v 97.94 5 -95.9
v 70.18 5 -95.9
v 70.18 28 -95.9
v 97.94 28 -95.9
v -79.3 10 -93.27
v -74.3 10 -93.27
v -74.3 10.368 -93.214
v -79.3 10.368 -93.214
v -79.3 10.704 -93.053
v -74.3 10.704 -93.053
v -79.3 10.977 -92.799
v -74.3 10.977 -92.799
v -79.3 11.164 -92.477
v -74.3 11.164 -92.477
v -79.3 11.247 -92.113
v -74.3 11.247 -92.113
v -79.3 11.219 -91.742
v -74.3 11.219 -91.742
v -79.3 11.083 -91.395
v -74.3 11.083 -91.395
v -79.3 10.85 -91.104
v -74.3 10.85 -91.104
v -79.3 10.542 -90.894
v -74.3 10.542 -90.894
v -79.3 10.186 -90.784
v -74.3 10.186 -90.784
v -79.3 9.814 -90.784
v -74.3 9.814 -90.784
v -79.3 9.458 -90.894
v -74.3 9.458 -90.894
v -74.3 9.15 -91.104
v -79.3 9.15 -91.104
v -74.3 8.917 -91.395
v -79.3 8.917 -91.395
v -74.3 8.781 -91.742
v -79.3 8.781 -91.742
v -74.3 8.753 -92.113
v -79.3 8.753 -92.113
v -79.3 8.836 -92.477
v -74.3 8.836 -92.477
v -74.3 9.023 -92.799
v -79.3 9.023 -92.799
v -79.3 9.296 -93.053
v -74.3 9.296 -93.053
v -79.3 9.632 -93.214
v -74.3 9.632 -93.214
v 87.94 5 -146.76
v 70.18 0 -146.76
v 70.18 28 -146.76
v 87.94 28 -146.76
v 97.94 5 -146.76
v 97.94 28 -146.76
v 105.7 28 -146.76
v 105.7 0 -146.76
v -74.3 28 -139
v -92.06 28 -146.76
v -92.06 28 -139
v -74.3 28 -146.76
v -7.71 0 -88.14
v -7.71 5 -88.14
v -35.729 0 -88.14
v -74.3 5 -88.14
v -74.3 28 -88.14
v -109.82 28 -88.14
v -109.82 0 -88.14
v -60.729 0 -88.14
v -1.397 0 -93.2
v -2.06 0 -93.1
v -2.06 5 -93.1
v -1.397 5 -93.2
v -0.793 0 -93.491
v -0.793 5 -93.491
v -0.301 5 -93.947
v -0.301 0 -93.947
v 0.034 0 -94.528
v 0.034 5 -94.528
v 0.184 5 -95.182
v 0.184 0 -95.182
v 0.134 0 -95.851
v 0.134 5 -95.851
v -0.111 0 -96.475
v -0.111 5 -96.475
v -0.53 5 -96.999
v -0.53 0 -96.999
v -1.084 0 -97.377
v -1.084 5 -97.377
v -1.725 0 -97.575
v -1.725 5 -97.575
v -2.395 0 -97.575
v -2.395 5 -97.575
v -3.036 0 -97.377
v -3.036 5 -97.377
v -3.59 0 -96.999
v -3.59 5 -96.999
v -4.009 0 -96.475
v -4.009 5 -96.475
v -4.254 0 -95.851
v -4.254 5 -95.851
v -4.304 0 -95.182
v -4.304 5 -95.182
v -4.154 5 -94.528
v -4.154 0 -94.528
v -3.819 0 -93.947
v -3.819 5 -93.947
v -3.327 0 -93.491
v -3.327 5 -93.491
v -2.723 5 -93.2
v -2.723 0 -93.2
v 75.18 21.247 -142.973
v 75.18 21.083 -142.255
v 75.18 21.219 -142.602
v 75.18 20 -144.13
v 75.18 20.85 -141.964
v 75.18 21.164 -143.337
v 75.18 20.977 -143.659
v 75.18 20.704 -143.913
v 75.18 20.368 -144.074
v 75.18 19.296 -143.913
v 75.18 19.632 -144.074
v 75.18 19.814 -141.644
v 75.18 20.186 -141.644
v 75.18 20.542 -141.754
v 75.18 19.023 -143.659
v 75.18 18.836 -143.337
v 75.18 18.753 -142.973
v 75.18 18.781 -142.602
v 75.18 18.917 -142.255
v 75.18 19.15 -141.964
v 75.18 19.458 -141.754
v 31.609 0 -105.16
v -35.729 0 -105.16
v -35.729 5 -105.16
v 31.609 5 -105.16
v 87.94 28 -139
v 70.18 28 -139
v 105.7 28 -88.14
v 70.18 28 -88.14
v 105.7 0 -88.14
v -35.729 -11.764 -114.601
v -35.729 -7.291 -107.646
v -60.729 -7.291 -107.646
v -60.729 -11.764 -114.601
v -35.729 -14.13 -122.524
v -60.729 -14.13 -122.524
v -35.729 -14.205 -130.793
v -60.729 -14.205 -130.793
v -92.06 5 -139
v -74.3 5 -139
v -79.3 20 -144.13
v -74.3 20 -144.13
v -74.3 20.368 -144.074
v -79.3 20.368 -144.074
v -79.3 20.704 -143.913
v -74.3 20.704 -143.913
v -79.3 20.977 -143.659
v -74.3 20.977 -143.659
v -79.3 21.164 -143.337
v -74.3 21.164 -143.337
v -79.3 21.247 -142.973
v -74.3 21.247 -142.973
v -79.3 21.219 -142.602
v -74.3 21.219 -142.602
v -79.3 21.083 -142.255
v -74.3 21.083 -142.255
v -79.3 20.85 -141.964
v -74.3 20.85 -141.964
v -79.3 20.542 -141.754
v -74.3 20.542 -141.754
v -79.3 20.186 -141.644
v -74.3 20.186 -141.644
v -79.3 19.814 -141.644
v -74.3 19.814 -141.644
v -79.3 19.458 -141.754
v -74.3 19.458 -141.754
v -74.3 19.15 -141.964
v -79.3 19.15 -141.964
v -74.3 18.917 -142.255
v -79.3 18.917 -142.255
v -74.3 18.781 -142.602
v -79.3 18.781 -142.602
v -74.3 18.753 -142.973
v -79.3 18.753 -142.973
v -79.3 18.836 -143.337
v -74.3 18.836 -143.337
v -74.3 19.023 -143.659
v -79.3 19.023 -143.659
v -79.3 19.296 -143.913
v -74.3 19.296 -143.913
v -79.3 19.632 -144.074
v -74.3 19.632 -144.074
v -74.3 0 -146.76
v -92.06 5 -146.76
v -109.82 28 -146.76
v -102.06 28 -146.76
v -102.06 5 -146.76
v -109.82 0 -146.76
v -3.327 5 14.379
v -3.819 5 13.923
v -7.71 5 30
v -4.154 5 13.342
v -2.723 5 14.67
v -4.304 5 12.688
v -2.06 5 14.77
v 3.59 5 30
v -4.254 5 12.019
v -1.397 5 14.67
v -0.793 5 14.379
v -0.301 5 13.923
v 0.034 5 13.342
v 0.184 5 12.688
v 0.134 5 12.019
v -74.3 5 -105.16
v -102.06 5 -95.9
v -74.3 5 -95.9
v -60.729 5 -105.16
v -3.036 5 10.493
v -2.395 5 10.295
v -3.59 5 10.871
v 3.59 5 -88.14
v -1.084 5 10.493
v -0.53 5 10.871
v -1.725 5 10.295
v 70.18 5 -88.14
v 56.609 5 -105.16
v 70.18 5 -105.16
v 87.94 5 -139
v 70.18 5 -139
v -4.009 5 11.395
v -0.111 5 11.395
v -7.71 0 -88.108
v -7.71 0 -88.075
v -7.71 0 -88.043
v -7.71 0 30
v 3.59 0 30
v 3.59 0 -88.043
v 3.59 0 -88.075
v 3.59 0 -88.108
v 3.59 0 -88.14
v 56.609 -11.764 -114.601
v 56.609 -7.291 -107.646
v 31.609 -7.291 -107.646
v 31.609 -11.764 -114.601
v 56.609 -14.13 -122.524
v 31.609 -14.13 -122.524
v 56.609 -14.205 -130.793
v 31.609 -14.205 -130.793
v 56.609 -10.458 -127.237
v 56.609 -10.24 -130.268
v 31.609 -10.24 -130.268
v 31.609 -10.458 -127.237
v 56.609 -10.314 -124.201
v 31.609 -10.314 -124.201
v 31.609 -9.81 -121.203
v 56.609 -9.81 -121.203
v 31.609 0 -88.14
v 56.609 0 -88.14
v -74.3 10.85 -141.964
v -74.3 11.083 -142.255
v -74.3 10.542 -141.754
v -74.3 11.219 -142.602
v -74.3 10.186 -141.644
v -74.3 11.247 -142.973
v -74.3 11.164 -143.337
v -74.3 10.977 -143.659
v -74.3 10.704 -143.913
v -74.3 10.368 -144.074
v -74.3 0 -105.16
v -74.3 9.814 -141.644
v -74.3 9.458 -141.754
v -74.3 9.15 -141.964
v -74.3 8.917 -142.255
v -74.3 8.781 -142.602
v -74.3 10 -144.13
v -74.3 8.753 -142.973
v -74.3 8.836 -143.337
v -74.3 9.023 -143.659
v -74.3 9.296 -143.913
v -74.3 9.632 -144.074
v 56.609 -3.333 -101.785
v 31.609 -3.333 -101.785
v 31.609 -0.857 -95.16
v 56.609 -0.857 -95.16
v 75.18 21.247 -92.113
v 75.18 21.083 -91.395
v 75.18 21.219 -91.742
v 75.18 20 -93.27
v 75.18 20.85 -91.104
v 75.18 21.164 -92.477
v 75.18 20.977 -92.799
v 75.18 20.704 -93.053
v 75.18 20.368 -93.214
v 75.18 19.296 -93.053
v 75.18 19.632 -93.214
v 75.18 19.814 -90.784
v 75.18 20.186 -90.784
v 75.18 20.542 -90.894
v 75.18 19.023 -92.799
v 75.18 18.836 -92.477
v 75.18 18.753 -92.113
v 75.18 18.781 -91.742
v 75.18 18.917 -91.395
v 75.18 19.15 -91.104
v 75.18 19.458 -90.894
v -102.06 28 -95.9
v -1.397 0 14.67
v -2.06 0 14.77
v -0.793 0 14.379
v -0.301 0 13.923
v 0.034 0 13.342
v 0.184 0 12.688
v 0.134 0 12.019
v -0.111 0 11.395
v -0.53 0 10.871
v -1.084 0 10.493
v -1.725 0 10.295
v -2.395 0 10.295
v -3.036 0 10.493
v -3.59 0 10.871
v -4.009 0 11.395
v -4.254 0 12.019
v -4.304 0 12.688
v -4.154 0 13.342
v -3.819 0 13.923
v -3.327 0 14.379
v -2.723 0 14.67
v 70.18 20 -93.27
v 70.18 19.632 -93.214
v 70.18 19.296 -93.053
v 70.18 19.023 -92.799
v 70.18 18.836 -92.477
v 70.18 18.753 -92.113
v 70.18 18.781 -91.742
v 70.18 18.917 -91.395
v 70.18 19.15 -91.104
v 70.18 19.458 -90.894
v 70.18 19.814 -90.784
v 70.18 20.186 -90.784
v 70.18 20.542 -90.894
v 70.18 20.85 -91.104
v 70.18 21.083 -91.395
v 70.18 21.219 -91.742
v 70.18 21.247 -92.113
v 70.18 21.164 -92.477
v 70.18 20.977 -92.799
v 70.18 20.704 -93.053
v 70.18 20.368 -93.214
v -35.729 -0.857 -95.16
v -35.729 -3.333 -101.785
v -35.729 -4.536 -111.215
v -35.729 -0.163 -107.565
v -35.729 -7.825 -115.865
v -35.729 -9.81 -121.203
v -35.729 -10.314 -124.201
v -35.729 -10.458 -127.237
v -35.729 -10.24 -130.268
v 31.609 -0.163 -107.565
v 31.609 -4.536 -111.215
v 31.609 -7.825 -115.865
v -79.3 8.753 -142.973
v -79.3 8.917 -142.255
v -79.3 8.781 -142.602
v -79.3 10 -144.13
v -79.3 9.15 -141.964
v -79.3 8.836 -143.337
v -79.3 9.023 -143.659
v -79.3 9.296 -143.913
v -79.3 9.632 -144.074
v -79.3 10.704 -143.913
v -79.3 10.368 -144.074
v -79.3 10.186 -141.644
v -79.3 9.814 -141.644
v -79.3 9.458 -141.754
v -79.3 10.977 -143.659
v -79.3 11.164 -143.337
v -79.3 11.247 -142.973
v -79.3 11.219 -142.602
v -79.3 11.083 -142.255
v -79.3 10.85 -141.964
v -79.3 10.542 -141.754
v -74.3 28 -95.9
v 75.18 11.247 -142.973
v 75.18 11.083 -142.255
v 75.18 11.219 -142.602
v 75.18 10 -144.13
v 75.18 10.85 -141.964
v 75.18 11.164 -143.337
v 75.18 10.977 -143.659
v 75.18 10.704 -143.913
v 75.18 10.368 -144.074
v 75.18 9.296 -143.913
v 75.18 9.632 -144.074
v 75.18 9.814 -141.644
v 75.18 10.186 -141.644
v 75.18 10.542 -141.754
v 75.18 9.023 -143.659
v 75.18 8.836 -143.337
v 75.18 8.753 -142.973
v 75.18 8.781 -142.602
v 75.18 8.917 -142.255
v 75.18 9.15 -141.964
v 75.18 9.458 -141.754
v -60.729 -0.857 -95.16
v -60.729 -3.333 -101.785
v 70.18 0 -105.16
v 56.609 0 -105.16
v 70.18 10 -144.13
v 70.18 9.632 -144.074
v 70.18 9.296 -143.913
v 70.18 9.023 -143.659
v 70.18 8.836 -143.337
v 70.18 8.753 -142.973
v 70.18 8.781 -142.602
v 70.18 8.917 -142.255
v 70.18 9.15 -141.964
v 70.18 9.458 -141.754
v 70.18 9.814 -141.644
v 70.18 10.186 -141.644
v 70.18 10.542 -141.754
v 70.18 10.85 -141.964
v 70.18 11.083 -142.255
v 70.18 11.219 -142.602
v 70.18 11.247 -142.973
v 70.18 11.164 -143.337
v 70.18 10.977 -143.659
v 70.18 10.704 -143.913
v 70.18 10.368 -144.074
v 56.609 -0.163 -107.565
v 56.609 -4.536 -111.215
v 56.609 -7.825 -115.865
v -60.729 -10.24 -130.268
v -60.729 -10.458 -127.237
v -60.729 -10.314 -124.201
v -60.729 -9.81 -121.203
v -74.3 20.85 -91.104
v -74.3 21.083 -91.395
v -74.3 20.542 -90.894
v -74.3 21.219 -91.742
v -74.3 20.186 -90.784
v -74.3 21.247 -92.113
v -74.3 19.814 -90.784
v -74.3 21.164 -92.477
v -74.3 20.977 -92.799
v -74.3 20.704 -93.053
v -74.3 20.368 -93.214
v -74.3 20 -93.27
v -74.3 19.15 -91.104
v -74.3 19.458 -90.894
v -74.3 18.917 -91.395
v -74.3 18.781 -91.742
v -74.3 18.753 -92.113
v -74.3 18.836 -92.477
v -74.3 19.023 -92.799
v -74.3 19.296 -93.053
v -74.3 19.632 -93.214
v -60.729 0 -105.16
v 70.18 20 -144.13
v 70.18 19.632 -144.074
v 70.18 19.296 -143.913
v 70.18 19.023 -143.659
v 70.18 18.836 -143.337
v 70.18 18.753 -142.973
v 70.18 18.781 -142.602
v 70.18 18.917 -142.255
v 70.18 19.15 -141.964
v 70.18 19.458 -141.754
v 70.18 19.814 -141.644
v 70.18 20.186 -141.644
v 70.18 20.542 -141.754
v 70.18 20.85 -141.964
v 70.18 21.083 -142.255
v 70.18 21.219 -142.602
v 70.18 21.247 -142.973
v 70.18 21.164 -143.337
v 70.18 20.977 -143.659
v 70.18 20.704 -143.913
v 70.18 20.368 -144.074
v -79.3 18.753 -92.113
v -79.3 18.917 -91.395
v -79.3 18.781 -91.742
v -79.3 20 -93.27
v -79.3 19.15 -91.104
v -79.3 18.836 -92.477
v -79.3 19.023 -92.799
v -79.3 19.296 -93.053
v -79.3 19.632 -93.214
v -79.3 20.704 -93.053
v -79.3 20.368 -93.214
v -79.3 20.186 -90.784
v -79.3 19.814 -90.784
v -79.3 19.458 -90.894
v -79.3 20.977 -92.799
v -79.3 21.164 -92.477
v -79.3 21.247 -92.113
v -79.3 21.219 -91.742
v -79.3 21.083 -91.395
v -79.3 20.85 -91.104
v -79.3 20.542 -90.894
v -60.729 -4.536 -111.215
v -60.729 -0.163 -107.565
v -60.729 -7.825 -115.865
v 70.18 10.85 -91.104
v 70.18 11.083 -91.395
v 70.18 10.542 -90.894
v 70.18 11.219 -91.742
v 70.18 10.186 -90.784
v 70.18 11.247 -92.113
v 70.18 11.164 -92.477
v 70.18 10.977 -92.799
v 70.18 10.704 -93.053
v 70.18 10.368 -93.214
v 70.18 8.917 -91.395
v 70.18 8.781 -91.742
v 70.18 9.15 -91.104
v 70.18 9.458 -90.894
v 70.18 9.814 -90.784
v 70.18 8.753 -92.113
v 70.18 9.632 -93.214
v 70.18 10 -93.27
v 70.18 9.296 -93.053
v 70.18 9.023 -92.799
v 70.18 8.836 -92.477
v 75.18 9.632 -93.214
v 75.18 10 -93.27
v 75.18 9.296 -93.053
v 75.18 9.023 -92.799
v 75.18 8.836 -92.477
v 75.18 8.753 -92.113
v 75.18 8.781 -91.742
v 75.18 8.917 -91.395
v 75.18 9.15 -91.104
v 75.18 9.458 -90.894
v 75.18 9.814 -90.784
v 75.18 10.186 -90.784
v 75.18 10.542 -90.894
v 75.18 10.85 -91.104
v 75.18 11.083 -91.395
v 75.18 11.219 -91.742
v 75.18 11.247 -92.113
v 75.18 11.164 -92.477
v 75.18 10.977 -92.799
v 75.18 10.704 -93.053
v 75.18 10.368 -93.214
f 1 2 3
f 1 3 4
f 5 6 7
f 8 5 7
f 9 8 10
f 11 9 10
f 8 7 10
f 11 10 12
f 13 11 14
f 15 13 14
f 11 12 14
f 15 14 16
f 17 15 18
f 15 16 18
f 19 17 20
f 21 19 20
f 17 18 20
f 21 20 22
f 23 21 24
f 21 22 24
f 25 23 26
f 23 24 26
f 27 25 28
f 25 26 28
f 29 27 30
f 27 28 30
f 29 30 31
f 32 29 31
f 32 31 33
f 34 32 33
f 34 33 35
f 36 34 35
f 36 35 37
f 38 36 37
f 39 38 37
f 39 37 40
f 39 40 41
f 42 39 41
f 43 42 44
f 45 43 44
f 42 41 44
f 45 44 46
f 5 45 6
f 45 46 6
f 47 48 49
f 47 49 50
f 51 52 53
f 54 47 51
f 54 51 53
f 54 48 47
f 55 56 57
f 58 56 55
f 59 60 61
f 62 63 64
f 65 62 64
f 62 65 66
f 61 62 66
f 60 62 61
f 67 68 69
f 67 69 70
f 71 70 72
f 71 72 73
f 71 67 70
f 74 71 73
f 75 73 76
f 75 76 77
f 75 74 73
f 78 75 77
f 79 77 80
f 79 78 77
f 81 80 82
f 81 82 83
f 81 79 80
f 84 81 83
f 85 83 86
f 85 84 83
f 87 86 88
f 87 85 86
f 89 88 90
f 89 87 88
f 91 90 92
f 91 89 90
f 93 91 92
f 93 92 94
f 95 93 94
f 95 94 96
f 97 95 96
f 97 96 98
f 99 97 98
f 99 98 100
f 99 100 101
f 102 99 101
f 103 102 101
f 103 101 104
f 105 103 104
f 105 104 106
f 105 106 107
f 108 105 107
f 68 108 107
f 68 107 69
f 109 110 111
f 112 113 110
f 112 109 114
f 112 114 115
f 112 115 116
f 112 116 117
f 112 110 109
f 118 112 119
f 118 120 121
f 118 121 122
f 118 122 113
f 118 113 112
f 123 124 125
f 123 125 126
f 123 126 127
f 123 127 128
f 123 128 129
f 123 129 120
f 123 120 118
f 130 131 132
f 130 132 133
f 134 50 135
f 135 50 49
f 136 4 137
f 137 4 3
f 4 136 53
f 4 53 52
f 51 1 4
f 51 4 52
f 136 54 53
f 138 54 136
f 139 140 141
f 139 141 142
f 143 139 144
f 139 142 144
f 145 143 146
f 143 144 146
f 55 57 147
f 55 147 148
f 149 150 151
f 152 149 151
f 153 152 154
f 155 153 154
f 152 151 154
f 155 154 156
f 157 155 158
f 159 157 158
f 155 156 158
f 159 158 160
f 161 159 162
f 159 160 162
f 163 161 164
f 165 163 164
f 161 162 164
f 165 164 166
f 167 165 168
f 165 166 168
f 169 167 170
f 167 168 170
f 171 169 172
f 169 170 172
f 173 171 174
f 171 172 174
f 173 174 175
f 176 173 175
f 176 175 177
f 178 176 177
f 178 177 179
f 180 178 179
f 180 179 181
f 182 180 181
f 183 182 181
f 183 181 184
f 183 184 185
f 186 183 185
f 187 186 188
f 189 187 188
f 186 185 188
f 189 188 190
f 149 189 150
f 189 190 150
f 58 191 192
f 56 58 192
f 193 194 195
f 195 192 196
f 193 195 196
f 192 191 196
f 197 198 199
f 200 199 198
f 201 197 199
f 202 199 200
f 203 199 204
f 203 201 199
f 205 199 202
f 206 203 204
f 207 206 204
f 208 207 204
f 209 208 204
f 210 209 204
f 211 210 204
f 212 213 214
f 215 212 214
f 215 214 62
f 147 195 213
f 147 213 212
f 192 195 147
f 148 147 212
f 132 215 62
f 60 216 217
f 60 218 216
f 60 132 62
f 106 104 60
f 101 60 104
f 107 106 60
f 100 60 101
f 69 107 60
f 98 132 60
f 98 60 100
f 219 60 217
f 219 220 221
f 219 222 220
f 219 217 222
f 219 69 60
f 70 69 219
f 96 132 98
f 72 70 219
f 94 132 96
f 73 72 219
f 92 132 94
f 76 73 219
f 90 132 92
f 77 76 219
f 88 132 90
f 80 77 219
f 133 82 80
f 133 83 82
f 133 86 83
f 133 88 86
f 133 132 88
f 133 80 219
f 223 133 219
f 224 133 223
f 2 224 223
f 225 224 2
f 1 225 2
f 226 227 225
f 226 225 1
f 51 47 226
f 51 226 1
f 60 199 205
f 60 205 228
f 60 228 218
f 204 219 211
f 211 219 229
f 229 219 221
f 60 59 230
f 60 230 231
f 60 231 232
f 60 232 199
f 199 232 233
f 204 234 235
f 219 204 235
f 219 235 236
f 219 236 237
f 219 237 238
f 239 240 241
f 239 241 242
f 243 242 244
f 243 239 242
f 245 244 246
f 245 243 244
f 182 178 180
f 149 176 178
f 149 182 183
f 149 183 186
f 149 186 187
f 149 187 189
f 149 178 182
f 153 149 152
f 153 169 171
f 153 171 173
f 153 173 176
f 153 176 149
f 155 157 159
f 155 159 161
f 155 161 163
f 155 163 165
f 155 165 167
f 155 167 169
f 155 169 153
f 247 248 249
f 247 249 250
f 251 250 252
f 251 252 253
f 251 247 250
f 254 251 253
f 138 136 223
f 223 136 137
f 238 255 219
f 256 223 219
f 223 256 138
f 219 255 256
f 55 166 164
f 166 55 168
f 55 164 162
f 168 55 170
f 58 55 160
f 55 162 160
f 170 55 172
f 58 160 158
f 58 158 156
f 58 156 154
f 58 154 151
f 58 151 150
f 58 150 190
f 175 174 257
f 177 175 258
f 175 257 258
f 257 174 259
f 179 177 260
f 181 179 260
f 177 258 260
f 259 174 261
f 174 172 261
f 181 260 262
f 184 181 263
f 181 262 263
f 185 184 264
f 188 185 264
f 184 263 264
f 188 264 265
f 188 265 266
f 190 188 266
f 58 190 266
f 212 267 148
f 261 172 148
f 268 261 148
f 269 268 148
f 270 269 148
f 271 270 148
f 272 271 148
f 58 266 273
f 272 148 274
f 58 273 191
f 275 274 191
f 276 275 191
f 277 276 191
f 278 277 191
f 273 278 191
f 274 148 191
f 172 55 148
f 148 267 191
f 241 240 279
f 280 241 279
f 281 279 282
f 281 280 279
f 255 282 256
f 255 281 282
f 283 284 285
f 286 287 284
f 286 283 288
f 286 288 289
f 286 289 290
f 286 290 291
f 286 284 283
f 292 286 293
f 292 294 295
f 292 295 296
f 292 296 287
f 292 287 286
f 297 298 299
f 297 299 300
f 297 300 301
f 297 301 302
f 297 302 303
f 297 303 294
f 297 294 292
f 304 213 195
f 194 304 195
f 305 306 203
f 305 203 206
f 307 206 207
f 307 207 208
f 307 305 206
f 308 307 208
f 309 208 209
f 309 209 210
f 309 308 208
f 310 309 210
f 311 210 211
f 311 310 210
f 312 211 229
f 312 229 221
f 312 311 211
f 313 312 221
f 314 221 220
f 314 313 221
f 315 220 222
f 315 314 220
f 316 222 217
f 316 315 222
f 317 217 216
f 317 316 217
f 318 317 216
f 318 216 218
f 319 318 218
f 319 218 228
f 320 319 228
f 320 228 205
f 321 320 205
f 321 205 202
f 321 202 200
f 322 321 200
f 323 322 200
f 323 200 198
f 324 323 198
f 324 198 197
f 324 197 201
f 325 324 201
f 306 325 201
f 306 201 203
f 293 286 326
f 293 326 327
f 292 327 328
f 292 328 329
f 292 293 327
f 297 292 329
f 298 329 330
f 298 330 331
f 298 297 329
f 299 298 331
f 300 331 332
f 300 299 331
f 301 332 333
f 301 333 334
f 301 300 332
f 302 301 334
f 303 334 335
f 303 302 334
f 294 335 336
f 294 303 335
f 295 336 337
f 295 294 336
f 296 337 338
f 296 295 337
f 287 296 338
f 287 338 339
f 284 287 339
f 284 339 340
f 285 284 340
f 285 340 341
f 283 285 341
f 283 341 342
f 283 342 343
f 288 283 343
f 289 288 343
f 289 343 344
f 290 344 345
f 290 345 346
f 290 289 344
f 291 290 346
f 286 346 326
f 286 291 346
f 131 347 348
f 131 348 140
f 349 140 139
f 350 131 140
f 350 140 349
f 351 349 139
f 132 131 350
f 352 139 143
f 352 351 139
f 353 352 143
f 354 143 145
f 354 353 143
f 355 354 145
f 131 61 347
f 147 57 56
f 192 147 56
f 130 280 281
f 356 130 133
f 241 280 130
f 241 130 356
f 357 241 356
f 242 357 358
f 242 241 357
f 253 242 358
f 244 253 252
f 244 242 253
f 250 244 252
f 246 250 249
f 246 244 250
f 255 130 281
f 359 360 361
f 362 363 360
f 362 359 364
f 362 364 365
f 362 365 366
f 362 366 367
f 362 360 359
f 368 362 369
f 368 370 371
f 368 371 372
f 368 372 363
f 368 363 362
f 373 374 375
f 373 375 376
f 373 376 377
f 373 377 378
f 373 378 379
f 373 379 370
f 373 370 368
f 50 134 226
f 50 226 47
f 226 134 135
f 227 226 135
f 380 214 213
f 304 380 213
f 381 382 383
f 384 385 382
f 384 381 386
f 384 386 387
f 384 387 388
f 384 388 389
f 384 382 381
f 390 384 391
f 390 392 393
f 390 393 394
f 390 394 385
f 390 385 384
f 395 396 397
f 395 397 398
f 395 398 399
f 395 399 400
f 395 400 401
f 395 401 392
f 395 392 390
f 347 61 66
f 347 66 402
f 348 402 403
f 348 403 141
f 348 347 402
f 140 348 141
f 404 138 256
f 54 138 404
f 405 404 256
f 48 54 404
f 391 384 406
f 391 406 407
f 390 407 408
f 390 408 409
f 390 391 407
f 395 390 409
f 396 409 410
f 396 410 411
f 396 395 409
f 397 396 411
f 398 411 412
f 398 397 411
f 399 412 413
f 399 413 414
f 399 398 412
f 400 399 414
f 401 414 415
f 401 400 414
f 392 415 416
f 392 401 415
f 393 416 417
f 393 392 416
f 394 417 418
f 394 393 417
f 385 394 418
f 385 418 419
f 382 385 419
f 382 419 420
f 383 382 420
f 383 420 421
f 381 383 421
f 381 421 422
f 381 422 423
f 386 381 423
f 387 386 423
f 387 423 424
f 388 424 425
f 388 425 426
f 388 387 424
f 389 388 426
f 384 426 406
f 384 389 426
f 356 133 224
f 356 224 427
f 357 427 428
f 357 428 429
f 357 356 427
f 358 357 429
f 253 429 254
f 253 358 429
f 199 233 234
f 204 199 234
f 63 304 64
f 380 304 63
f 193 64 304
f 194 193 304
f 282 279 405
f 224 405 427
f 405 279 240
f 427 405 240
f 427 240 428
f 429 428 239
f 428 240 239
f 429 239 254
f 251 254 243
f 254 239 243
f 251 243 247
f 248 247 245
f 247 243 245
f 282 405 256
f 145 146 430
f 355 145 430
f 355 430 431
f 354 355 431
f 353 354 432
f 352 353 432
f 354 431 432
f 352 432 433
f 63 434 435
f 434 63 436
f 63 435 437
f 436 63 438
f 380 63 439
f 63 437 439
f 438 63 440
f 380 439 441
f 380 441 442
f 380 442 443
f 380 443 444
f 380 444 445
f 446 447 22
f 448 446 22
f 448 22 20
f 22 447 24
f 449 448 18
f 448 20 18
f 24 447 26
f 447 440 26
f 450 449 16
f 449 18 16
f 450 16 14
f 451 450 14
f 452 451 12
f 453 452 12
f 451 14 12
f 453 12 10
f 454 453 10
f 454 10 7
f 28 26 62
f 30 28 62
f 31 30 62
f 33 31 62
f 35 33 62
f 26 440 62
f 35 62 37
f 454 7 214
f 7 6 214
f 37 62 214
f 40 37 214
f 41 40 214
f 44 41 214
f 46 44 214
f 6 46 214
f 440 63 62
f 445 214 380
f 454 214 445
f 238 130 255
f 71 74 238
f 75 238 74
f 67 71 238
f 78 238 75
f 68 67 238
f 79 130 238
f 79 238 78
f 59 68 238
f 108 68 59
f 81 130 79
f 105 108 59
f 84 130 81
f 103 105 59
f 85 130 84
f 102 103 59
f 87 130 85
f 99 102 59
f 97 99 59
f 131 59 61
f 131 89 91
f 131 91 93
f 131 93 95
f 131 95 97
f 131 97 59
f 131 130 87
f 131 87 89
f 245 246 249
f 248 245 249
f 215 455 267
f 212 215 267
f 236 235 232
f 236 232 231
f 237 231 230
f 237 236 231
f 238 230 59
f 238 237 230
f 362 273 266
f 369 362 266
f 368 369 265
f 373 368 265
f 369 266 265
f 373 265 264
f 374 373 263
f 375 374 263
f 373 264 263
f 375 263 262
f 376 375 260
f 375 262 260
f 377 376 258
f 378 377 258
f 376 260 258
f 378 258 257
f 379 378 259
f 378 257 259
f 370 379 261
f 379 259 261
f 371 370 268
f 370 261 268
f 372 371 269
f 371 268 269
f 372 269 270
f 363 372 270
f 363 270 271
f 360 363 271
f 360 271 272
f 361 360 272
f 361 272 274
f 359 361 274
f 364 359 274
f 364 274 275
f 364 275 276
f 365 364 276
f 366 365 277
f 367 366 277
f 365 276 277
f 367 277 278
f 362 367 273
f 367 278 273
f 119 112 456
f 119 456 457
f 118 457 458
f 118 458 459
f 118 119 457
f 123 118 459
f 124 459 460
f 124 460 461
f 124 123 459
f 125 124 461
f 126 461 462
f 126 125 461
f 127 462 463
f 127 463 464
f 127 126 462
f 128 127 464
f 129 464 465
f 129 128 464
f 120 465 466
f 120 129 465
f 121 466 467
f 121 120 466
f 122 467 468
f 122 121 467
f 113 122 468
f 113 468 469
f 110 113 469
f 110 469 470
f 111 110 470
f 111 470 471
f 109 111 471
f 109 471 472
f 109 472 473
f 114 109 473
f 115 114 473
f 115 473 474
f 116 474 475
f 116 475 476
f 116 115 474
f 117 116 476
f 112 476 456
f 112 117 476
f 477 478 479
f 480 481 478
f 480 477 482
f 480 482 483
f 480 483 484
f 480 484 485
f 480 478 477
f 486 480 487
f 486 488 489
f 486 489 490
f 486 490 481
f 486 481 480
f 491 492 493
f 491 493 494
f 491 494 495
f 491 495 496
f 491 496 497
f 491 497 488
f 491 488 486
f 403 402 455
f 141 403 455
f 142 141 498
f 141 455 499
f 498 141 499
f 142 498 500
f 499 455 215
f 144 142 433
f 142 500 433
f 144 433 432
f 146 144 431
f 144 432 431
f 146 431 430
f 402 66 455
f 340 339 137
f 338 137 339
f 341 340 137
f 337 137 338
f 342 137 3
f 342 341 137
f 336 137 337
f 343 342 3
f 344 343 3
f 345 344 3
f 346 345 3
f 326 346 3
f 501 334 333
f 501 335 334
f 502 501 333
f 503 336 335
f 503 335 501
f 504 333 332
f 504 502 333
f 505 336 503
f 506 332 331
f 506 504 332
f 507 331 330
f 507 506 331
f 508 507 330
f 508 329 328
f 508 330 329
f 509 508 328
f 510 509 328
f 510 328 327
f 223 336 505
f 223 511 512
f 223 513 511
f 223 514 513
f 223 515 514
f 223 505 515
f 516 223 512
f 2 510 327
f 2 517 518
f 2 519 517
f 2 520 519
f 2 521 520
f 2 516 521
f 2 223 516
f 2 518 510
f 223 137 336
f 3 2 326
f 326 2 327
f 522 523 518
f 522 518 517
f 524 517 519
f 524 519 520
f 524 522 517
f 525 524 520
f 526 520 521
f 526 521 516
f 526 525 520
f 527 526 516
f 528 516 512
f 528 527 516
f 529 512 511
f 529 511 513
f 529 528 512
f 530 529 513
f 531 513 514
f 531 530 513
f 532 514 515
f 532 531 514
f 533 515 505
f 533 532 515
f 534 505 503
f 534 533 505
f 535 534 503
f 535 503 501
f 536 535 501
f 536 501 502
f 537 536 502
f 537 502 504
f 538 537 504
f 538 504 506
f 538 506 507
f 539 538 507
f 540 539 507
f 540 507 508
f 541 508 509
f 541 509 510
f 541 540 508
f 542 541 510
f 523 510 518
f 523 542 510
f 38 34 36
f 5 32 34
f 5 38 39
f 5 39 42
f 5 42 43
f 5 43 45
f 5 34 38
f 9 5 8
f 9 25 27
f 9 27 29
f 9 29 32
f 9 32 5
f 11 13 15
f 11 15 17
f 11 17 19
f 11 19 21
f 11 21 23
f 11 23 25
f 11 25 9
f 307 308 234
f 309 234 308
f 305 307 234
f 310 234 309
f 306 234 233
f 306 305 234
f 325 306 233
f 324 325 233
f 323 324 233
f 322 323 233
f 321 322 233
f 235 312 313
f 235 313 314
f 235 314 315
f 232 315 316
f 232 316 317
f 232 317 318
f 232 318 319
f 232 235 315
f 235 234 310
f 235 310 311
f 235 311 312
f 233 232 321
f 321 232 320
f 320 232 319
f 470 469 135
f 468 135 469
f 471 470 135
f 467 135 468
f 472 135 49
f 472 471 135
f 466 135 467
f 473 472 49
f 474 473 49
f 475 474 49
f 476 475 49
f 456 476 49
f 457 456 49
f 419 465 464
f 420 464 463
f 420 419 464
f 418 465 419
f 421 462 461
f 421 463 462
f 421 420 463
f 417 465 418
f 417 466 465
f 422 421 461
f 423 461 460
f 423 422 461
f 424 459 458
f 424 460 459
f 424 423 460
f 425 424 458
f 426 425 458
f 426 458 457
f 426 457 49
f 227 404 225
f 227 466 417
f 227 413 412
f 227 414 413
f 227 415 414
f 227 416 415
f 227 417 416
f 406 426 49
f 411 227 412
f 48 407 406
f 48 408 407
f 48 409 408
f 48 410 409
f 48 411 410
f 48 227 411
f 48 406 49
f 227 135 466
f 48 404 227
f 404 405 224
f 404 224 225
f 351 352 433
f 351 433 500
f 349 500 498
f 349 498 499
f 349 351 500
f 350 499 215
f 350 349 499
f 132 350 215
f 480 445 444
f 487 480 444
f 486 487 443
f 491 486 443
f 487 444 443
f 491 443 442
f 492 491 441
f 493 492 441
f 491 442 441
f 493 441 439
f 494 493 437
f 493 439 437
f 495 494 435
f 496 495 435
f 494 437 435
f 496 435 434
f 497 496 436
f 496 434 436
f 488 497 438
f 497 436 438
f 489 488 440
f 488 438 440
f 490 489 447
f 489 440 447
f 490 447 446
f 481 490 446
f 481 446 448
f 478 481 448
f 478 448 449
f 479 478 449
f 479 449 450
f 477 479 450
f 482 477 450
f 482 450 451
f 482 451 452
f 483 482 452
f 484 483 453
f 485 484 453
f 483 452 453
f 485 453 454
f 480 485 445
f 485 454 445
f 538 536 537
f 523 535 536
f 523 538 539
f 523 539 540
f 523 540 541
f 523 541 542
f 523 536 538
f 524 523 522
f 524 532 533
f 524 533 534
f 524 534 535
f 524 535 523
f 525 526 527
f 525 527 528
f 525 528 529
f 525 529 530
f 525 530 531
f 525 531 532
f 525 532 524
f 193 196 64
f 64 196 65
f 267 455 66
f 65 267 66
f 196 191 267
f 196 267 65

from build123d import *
from build123d.topology import SkipClean

# Parameters (mm, degrees)
BOSS_EXTRUDE1_DEPTH = 5
SKETCH7_W           = 17.76
SKETCH7_H           = 7.76
BOSS_EXTRUDE2_DEPTH = 23
SKETCH8_R           = 1.25
CUT_EXTRUDE1_DEPTH  = 5
CUT_EXTRUDE2_START  = -5
SKETCH9_R           = 1.25
CUT_EXTRUDE2_DEPTH  = 5
BOSS_EXTRUDE3_DEPTH = 25
FILLET1_R           = 22
FILLET2_R           = 30


with BuildPart() as part:
    # Sketch5 → Boss-Extrude1 (new body)
    with BuildSketch(Plane(origin=(0, 0, 0), x_dir=(1, 0, 0), z_dir=(0, 1, 0))):
        with BuildLine():
            Line((-7.71, 88.14), (-7.71, -30))
            Line((-7.71, -30), (-2.06, -30))
            Line((-2.06, -30), (-2.06, -14.77))
            ThreePointArc((-2.06, -14.77), (-4.31, -12.52), (-2.06, -10.27))
            Line((-2.06, -10.27), (-2.06, 93.1))
            ThreePointArc((-2.06, 93.1), (-4.31, 95.35), (-2.06, 97.6))
            Line((-2.06, 97.6), (-2.06, 105.16))
            Line((-2.06, 105.16), (-74.3, 105.16))
            Line((-74.3, 105.16), (-74.3, 146.76))
            Line((-74.3, 146.76), (-109.82, 146.76))
            Line((-109.82, 146.76), (-109.82, 88.14))
            Line((-109.82, 88.14), (-7.71, 88.14))
        make_face()
    boss_extrude1 = extrude(amount=BOSS_EXTRUDE1_DEPTH)

    # Sketch7 → Boss-Extrude2 (add)
    with BuildSketch(Plane(origin=(0, 5, 0), x_dir=(1, 0, 0), z_dir=(0, 1, 0))):
        Polygon((-109.82, 146.76), (-109.82, 88.14), (-74.3, 88.14), (-74.3, 95.9), (-102.06, 95.9), (-102.06, 146.76), align=None)
        with Locations((-83.18, 142.88)):
            Rectangle(SKETCH7_W, SKETCH7_H)
    boss_extrude2 = extrude(amount=BOSS_EXTRUDE2_DEPTH)

    # Sketch8 → Cut-Extrude1 (cut)
    with BuildSketch(Plane(origin=(-74.3, 0, 0), x_dir=(0, 0, -1), z_dir=(1, 0, 0))):
        with Locations((92.02, 10)):
            Circle(SKETCH8_R)
        with Locations((92.02, 20)):
            Circle(SKETCH8_R)
        with Locations((142.88, 10)):
            Circle(SKETCH8_R)
        with Locations((142.88, 20)):
            Circle(SKETCH8_R)
    extrude(amount=-CUT_EXTRUDE1_DEPTH, mode=Mode.SUBTRACT)

    # Mirror2: Boss-Extrude1, Boss-Extrude2 across plane
    with SkipClean():  # the faces are left unmerged after this step: merging them gives an invalid solid
        add(boss_extrude1.mirror(Plane(origin=(-2.06, 5, 0), x_dir=(0, 0, 1), z_dir=(1, 0, 0))))
        add(boss_extrude2.mirror(Plane(origin=(-2.06, 5, 0), x_dir=(0, 0, 1), z_dir=(1, 0, 0))))

    # Sketch9 → Cut-Extrude2 (cut)
    with SkipClean():  # the faces are left unmerged after this step: merging them gives an invalid solid
        with BuildSketch(Plane.ZY.offset(-70.18).offset(CUT_EXTRUDE2_START)):
            with Locations(Location((-142.88, 10, 0), (0, 0, 180))):
                Circle(SKETCH9_R)
            with Locations(Location((-142.88, 20, 0), (0, 0, 180))):
                Circle(SKETCH9_R)
            with Locations(Location((-92.02, 10, 0), (0, 0, 180))):
                Circle(SKETCH9_R)
            with Locations(Location((-92.02, 20, 0), (0, 0, 180))):
                Circle(SKETCH9_R)
        extrude(amount=CUT_EXTRUDE2_DEPTH, mode=Mode.SUBTRACT)

    # Sketch12 → Boss-Extrude3 (add)
    with SkipClean():  # the faces are left unmerged after this step: merging them gives an invalid solid
        with BuildSketch(Plane(origin=(-60.728648392, 0, 0), x_dir=(0, 0, -1), z_dir=(1, 0, 0))):
            with BuildLine():
                Line((130.792872119, -14.205030824), (130.268072642, -10.239607075))
                ThreePointArc((130.268072642, -10.239607075), (114.312520733, -7.123943435), (103.482147137, 5))
                Line((103.482147137, 5), (99.183531943, 5))
                ThreePointArc((99.183531943, 5), (111.604669447, -10.171432922), (130.792872119, -14.205030824))
            make_face()
        boss_extrude3 = extrude(amount=BOSS_EXTRUDE3_DEPTH)

    # Mirror3: Boss-Extrude3 across plane
    with SkipClean():  # the faces are left unmerged after this step: merging them gives an invalid solid
        add(boss_extrude3.mirror(Plane(origin=(-2.06, 0, 0), x_dir=(0, 0, 1), z_dir=(1, 0, 0))))

    # Fillet1
    # the kernel refuses this fillet: 22 mm, written as the material it adds along each edge
    with BuildSketch(Plane(origin=(-35.728648392, 1.749196605, -105.16), x_dir=(0, 1, 0), z_dir=(-1, 0, 0))) as fillet1_piece_1:
        with BuildLine():
            CenterArc((9.879940472, 20.977477008), FILLET1_R, 192.960861786, 59.501970429)
            Line((-11.559576515, 16.043197795), (-11.988366855, 15.94451221))
            ThreePointArc((-11.988366855, 15.94451221), (-7.755155531, 6.598291061), (-0.22933098, -0.375509389))
            Line((-0.22933098, -0.375509389), (0, -0.44))
            ThreePointArc((0, -0.44), (1.625401698, -0.44), (3.118220654, -0.41954954))
            Line((3.118220654, -0.41954954), (3.250803395, 0))
        make_face()
    extrude(amount=25)
    with BuildSketch(Plane(origin=(31.608648392, 1.749196605, -105.16), x_dir=(0, 1, 0), z_dir=(1, 0, 0))) as fillet1_piece_2:
        with BuildLine():
            CenterArc((9.879940472, -20.977477008), FILLET1_R, 107.537167785, 59.501970429)
            Line((-11.559576515, -16.043197795), (-11.988366855, -15.94451221))
            ThreePointArc((-11.988366855, -15.94451221), (-7.755155531, -6.598291061), (-0.22933098, 0.375509389))
            Line((-0.22933098, 0.375509389), (0, 0.44))
            ThreePointArc((0, 0.44), (1.625401698, 0.44), (3.118220654, 0.41954954))
            Line((3.118220654, 0.41954954), (3.250803395, 0))
        make_face()
    extrude(amount=25)

    # Fillet2
    # the kernel refuses this fillet: 30 mm, written as the material it adds along each edge
    with BuildSketch(Plane(origin=(-1.974069594, 0, -101.544349118), x_dir=(0, 0, 1), z_dir=(-1, 0, 0))) as fillet2_piece_1_section:
        with BuildLine():
            CenterArc((13.501831519, -30), FILLET2_R, 90, 40.801822192)
            ThreePointArc((-6.101508838, -7.290771769), (-2.755120907, -3.892795973), (0, 0))
            Line((0, 0), (13.501831519, 0))
        make_face()
    fillet2_piece_1 = extrude(amount=58.754578797, mode=Mode.PRIVATE)
    fillet2_piece_1 = split(fillet2_piece_1, bisect_by=Plane(origin=(-4.842034797, 0.299973601, -88.14), z_dir=(0, 0, 1)), keep=Keep.TOP, mode=Mode.PRIVATE)
    fillet2_piece_1 = split(fillet2_piece_1, bisect_by=Plane(origin=(-7.71, 0.299973601, -88.091260944), z_dir=(1, 0, 0)), keep=Keep.TOP, mode=Mode.PRIVATE)
    add(fillet2_piece_1)
    with BuildSketch(Plane(origin=(-35.728648392, 0, -101.544349118), x_dir=(0, 0, 1), z_dir=(-1, 0, 0))) as fillet2_piece_2_section:
        with BuildLine():
            CenterArc((13.501831519, -30), FILLET2_R, 90, 40.801822192)
            ThreePointArc((-6.101508838, -7.290771769), (-2.755120907, -3.892795973), (0, 0))
            Line((0, 0), (13.501831519, 0))
        make_face()
    fillet2_piece_2 = extrude(amount=25, mode=Mode.PRIVATE)
    fillet2_piece_2 = split(fillet2_piece_2, bisect_by=Plane(origin=(-48.228648392, -1.487894786, -88.14), z_dir=(0, 0, -1)), keep=Keep.TOP, mode=Mode.PRIVATE)
    add(fillet2_piece_2)
    with BuildSketch(Plane(origin=(-2.145930406, 0, -101.544349118), x_dir=(0, 0, 1), z_dir=(1, 0, 0))) as fillet2_piece_3_section:
        with BuildLine():
            CenterArc((13.501831519, 30), FILLET2_R, 229.198177808, 40.801822192)
            ThreePointArc((-6.101508838, 7.290771769), (-2.755120907, 3.892795973), (0, 0))
            Line((0, 0), (13.501831519, 0))
        make_face()
    fillet2_piece_3 = extrude(amount=58.754578797, mode=Mode.PRIVATE)
    fillet2_piece_3 = split(fillet2_piece_3, bisect_by=Plane(origin=(3.59, 0.299973601, -88.091260944), z_dir=(-1, 0, 0)), keep=Keep.TOP, mode=Mode.PRIVATE)
    fillet2_piece_3 = split(fillet2_piece_3, bisect_by=Plane(origin=(0.722034797, 0.299973601, -88.14), z_dir=(0, 0, 1)), keep=Keep.TOP, mode=Mode.PRIVATE)
    add(fillet2_piece_3)
    with BuildSketch(Plane(origin=(31.608648392, 0, -101.544349118), x_dir=(0, 0, 1), z_dir=(1, 0, 0))) as fillet2_piece_4_section:
        with BuildLine():
            CenterArc((13.501831519, 30), FILLET2_R, 229.198177808, 40.801822192)
            ThreePointArc((-6.101508838, 7.290771769), (-2.755120907, 3.892795973), (0, 0))
            Line((0, 0), (13.501831519, 0))
        make_face()
    fillet2_piece_4 = extrude(amount=25, mode=Mode.PRIVATE)
    fillet2_piece_4 = split(fillet2_piece_4, bisect_by=Plane(origin=(44.108648392, -1.487894786, -88.14), z_dir=(0, 0, -1)), keep=Keep.TOP, mode=Mode.PRIVATE)
    add(fillet2_piece_4)


solid = part.part
